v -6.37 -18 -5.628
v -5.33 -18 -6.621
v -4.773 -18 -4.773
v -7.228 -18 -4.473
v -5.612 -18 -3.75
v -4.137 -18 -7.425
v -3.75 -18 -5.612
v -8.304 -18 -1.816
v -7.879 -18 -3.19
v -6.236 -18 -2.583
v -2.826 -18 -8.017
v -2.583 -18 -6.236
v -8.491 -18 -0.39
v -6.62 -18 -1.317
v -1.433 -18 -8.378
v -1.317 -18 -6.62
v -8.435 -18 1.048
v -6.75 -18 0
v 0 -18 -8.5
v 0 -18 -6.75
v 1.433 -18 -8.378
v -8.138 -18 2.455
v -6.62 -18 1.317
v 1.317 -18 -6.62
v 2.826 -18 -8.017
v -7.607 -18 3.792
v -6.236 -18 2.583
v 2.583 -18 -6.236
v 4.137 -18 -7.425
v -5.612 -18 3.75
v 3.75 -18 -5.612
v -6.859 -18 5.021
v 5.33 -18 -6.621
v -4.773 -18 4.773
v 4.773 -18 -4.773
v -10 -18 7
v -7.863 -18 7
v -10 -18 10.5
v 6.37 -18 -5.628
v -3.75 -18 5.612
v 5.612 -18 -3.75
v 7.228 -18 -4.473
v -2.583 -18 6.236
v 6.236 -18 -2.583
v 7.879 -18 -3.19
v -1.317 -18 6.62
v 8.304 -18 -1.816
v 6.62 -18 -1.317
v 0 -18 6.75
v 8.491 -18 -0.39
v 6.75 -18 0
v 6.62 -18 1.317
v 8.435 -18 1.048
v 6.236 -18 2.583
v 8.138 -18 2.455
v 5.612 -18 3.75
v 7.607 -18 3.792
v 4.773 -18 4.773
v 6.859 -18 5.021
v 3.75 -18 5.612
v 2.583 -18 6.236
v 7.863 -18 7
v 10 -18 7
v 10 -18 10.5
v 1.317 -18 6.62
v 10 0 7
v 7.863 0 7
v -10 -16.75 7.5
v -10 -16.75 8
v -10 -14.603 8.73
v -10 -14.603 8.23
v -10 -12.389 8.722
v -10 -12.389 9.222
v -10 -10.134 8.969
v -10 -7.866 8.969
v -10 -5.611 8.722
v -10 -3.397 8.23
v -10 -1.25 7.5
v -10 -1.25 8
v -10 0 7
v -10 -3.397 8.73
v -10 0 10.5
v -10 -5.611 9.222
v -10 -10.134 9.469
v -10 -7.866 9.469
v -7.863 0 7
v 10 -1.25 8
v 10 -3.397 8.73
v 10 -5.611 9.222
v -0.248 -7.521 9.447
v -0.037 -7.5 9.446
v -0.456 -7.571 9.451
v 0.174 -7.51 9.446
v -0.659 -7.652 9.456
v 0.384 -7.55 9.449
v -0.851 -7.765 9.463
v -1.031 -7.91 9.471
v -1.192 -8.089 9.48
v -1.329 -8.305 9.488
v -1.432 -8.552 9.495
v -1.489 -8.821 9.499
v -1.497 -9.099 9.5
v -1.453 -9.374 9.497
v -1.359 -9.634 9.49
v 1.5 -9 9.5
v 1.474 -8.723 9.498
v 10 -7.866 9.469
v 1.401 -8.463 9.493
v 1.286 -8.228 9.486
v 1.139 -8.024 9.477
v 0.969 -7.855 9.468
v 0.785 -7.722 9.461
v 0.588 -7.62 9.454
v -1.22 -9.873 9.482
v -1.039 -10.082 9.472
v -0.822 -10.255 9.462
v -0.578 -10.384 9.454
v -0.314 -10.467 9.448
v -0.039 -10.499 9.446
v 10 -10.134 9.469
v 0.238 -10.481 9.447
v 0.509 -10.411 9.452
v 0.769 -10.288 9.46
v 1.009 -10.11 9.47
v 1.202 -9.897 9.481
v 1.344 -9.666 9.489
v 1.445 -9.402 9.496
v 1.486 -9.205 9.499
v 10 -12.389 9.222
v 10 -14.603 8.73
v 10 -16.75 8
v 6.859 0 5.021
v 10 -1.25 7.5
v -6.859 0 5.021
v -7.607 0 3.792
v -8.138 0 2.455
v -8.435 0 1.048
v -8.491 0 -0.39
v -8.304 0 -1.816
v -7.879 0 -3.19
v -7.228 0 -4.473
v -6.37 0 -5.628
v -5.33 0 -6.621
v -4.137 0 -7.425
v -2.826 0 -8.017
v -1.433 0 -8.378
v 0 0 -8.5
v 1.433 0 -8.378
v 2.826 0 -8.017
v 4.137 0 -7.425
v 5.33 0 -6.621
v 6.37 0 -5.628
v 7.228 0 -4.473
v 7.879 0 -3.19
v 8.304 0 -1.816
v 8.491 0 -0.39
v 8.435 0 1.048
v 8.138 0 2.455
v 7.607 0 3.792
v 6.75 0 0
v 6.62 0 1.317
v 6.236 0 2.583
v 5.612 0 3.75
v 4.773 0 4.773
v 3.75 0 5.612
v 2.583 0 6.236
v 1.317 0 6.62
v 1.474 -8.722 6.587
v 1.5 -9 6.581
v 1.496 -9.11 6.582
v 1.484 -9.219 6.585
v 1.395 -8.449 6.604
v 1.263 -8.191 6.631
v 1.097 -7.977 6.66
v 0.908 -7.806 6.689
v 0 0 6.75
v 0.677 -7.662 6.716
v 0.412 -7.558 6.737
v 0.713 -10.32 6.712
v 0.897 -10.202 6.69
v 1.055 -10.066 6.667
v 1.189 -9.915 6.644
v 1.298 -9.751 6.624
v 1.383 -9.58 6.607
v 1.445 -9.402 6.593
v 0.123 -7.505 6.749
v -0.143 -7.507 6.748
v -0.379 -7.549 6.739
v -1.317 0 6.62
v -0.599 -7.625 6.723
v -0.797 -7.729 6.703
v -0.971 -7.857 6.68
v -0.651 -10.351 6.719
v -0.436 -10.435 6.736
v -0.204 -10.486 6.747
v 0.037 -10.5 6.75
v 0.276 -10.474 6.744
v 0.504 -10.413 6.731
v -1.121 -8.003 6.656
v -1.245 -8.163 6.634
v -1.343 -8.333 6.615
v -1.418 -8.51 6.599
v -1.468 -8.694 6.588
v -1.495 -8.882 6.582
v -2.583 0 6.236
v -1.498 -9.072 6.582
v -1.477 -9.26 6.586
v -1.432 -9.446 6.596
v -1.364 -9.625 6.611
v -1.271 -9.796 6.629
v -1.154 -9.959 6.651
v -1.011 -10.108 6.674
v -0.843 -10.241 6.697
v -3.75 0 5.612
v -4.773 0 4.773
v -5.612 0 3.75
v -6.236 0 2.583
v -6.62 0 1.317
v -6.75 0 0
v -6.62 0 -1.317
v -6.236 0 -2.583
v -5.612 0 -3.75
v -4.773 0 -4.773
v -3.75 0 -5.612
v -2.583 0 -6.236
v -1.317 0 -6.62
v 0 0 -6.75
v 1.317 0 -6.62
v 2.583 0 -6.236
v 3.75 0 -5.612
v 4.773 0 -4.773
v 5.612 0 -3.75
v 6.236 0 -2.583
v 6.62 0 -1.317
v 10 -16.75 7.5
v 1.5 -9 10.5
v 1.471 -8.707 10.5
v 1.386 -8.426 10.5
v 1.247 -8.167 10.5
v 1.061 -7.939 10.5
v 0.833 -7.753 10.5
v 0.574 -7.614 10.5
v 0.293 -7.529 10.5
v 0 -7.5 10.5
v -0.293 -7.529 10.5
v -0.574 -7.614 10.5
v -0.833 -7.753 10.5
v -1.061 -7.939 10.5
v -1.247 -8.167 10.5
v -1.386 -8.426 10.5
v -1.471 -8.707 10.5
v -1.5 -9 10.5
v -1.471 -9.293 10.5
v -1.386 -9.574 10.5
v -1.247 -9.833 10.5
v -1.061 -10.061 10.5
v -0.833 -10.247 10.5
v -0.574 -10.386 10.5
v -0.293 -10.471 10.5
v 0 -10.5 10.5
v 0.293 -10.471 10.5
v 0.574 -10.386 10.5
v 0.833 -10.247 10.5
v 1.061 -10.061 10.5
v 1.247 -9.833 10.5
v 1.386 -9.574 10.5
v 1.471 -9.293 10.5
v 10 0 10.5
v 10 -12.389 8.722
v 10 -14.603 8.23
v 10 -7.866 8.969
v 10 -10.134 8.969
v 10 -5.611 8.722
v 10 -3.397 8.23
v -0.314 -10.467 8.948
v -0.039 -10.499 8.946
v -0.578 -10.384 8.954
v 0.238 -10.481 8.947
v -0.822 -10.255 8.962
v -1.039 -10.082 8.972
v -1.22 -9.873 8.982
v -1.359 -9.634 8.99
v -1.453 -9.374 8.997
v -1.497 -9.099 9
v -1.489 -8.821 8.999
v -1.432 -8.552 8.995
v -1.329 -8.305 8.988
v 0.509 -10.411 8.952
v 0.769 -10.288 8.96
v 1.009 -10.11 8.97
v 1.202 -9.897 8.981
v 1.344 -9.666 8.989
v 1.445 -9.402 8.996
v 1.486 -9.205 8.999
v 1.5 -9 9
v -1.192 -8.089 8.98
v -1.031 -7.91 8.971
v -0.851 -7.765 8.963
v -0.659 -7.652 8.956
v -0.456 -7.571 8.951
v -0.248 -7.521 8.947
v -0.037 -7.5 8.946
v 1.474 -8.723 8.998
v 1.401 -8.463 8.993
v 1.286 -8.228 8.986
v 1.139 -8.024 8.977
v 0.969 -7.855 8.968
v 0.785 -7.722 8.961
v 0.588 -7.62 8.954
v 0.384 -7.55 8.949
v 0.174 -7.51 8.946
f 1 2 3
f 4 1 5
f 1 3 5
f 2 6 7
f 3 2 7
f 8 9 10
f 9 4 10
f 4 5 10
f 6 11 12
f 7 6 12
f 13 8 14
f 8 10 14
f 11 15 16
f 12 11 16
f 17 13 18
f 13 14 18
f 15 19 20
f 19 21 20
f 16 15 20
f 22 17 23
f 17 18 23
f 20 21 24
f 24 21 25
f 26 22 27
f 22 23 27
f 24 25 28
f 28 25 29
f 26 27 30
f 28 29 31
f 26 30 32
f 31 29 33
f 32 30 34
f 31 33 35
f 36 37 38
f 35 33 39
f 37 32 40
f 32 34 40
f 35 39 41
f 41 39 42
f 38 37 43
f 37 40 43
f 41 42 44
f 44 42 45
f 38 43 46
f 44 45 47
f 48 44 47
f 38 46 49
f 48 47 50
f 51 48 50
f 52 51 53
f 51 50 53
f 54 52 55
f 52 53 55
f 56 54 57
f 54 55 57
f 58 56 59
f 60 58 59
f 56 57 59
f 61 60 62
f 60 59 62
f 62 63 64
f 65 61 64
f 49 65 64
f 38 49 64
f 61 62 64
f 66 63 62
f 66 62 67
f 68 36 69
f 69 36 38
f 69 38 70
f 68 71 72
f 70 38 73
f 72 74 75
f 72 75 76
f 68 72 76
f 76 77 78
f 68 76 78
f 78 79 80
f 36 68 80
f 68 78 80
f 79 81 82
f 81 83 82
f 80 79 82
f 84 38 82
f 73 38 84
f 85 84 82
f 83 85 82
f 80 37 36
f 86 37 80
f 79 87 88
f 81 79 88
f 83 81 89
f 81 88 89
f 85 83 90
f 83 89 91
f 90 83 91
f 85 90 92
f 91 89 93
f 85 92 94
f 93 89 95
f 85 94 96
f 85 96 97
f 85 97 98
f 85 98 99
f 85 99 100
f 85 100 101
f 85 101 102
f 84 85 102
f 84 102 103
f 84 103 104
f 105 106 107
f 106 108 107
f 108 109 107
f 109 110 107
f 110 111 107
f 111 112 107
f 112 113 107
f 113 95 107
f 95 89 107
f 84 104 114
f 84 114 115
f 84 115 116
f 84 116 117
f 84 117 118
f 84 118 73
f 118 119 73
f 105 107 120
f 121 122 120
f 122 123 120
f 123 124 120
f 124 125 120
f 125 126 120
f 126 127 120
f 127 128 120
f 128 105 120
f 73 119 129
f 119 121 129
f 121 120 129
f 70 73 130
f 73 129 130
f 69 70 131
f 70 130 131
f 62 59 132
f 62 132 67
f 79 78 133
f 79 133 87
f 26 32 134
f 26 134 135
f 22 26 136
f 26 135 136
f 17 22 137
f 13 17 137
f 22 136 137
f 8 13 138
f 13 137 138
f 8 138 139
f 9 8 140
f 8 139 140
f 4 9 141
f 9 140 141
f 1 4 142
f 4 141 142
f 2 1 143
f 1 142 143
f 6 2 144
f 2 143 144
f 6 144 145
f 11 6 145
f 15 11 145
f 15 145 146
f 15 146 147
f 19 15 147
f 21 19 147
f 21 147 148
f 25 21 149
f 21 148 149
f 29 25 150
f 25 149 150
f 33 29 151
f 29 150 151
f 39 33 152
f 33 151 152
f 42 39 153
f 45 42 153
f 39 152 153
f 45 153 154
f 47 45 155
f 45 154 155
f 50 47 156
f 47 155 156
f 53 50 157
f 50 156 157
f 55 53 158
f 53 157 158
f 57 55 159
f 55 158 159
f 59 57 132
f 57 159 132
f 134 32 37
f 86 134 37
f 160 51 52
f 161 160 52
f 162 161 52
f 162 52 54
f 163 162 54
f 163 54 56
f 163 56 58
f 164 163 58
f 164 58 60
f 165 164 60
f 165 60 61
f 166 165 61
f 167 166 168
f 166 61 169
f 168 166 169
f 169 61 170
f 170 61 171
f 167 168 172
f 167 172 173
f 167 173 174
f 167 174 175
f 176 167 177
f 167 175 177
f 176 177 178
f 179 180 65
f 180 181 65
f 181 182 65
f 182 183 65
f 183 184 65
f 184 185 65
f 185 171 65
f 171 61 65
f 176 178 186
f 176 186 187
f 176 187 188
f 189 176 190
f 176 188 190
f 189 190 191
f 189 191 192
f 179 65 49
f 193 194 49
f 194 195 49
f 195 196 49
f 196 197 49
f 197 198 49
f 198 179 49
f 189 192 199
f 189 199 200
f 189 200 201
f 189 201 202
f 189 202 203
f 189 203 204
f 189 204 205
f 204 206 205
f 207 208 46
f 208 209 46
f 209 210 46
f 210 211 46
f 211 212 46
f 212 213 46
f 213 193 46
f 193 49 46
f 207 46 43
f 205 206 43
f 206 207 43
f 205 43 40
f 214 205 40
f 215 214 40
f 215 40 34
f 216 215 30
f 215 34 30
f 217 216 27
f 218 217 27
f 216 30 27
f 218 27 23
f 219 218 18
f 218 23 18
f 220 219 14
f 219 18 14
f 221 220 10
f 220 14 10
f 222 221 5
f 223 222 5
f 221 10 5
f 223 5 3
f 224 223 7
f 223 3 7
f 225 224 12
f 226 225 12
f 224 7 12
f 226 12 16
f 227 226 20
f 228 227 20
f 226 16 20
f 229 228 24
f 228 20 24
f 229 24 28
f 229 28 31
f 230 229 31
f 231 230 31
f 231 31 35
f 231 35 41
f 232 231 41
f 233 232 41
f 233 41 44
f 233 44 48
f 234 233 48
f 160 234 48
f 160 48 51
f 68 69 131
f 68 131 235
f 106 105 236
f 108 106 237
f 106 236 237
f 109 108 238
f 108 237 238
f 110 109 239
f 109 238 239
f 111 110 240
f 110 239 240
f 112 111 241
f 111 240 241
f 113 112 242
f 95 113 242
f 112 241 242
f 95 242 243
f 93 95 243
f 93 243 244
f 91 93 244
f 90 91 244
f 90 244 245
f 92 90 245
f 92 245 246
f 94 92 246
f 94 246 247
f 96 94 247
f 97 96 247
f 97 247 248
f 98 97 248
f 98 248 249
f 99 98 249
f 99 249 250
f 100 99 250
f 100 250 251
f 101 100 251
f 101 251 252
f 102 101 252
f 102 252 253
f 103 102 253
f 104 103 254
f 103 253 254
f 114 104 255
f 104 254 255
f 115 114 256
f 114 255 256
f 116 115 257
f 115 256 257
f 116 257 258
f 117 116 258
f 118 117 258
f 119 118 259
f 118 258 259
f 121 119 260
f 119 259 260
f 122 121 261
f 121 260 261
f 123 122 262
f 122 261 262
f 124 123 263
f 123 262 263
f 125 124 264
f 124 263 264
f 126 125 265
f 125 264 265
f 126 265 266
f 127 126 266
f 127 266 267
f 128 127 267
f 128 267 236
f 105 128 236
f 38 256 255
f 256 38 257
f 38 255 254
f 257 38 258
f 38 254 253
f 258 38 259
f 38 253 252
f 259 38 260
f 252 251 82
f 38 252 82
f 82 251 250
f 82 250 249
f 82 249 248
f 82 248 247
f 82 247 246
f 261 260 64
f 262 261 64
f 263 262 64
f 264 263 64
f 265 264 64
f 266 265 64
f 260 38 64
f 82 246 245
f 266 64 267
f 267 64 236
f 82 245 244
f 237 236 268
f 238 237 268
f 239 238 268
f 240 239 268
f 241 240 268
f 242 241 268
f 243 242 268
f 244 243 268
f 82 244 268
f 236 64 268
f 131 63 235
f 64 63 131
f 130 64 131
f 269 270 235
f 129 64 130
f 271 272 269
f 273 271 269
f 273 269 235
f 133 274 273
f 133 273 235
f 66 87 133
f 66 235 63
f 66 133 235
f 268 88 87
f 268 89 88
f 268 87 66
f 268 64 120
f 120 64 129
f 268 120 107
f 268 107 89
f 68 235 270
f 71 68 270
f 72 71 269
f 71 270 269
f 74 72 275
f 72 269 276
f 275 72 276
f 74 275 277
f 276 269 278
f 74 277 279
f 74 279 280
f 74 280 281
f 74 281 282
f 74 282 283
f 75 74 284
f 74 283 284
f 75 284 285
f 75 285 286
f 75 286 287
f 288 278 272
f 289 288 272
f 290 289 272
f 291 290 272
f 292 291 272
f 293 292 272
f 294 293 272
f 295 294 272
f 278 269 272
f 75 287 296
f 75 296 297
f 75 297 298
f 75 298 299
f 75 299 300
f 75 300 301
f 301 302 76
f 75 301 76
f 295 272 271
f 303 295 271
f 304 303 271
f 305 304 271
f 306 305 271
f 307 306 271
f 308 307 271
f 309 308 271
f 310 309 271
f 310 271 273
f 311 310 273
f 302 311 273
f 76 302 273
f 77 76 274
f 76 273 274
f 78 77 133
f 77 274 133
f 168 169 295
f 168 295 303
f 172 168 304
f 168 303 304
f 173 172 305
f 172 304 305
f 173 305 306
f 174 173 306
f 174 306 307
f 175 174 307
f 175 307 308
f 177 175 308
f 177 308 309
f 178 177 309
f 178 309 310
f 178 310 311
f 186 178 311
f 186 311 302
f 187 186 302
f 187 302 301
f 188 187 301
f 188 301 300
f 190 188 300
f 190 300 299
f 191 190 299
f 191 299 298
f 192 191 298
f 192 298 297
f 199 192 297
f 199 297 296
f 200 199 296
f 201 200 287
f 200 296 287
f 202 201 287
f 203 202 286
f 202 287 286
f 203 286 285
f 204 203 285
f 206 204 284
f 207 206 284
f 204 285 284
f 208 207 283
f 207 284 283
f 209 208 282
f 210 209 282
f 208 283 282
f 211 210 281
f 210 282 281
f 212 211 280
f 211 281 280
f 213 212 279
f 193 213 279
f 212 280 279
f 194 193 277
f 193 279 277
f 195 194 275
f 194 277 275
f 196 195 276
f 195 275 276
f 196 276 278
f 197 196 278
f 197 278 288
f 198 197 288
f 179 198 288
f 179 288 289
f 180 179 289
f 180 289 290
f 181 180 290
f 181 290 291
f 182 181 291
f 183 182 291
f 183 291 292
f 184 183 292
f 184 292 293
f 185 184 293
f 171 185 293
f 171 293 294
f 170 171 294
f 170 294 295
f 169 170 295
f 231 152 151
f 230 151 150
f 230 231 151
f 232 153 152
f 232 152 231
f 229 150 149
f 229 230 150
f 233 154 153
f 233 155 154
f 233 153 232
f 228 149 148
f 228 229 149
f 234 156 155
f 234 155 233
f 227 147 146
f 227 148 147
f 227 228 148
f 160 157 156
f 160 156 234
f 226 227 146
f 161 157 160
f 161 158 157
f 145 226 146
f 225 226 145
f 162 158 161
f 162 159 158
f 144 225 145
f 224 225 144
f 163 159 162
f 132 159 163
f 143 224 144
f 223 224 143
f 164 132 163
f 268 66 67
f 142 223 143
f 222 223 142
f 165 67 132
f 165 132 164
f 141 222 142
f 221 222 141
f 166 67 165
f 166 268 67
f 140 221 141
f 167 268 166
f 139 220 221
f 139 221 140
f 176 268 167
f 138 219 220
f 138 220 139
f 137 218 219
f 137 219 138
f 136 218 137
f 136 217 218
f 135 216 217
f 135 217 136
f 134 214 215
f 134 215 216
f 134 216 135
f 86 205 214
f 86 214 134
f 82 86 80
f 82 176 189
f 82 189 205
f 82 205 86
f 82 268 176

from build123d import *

# Parameters (mm, degrees)
F0_R         = 8.5
F1_DEPTH     = 18
F2_R         = 6.75
F3_DEPTH     = 18
F4_W         = 18
F4_H         = 3.5
F5_DEPTH     = 10
F7_DEPTH     = 20
F8_R         = 1.5
F9_DEPTH     = 5
F10_T1_DEPTH = 18


# Not quite as in the source:
# - a fillet or chamfer that OpenCascade refuses, or shapes differently, is made with other operations: its cross-section is extruded or revolved along the edge and cut away or added


with BuildPart() as f1:
    # F0 (on Front) → F1 (new body)
    with BuildSketch(Plane.XZ):
        Circle(F0_R)
    extrude(amount=F1_DEPTH)

    # F2 (on face) → F3 (cut, through all)
    with BuildSketch(Plane.XZ.offset(18)):
        Circle(F2_R)
    extrude(amount=-F3_DEPTH, mode=Mode.SUBTRACT)

    # F4 (on Right) → F5 (join, symmetric)
    with BuildSketch(Plane.YZ):
        with Locations((-9, 8.75)):
            Rectangle(F4_W, F4_H)
    extrude(amount=F5_DEPTH, both=True)

    # F6 (on face) → F7 (cut, through all)
    with BuildSketch(Plane.YZ.offset(10)):
        with BuildLine():
            Line((-16.75, 8), (-16.75, 7.5))
            ThreePointArc((-16.75, 7.5), (-9, 9), (-1.25, 7.5))
            Line((-1.25, 7.5), (-1.25, 8))
            ThreePointArc((-1.25, 8), (-9, 9.5), (-16.75, 8))
        make_face()
    extrude(amount=-F7_DEPTH, mode=Mode.SUBTRACT)

    # F8 (on face) → F9 (cut)
    with BuildSketch(Plane.XY.offset(10.5)):
        with Locations((0, -9)):
            Circle(F8_R)
    extrude(amount=-F9_DEPTH, mode=Mode.SUBTRACT)

    # F10: chamfer of 4 on 2 edges, made by hand

    # F10_s2 → F10_t1 (join)
    with BuildSketch(Plane.XZ):
        with BuildLine():
            Line((-6.7863990228, 4.8779762725), (-7.9352464288, 7.1426903404))
            Line((-7.9352464288, 7.1426903404), (-7.9352464288, 7.2226903404))
            ThreePointArc((-7.9352464288, 7.2226903404), (-6.3785359046, 7.08), (-4.8218253805, 7.08))
            Line((-4.8218253805, 7.08), (-4.7764434946, 6.9341176471))
            ThreePointArc((-4.7764434946, 6.9341176471), (-5.8850678371, 6.0218250184), (-6.7218457694, 4.8307229397))
            Line((-6.7218457694, 4.8307229397), (-6.7863990228, 4.8779762725))
        make_face()
        with BuildLine():
            Line((6.7863990228, 4.8779762725), (7.9352464288, 7.1426903404))
            Line((7.9352464288, 7.1426903404), (7.9352464288, 7.2226903404))
            ThreePointArc((7.9352464288, 7.2226903404), (6.3785359046, 7.08), (4.8218253805, 7.08))
            Line((4.8218253805, 7.08), (4.7764434946, 6.9341176471))
            ThreePointArc((4.7764434946, 6.9341176471), (5.8850678371, 6.0218250184), (6.7218457694, 4.8307229397))
            Line((6.7218457694, 4.8307229397), (6.7863990228, 4.8779762725))
        make_face()
    extrude(amount=F10_T1_DEPTH)


solid = f1.part
